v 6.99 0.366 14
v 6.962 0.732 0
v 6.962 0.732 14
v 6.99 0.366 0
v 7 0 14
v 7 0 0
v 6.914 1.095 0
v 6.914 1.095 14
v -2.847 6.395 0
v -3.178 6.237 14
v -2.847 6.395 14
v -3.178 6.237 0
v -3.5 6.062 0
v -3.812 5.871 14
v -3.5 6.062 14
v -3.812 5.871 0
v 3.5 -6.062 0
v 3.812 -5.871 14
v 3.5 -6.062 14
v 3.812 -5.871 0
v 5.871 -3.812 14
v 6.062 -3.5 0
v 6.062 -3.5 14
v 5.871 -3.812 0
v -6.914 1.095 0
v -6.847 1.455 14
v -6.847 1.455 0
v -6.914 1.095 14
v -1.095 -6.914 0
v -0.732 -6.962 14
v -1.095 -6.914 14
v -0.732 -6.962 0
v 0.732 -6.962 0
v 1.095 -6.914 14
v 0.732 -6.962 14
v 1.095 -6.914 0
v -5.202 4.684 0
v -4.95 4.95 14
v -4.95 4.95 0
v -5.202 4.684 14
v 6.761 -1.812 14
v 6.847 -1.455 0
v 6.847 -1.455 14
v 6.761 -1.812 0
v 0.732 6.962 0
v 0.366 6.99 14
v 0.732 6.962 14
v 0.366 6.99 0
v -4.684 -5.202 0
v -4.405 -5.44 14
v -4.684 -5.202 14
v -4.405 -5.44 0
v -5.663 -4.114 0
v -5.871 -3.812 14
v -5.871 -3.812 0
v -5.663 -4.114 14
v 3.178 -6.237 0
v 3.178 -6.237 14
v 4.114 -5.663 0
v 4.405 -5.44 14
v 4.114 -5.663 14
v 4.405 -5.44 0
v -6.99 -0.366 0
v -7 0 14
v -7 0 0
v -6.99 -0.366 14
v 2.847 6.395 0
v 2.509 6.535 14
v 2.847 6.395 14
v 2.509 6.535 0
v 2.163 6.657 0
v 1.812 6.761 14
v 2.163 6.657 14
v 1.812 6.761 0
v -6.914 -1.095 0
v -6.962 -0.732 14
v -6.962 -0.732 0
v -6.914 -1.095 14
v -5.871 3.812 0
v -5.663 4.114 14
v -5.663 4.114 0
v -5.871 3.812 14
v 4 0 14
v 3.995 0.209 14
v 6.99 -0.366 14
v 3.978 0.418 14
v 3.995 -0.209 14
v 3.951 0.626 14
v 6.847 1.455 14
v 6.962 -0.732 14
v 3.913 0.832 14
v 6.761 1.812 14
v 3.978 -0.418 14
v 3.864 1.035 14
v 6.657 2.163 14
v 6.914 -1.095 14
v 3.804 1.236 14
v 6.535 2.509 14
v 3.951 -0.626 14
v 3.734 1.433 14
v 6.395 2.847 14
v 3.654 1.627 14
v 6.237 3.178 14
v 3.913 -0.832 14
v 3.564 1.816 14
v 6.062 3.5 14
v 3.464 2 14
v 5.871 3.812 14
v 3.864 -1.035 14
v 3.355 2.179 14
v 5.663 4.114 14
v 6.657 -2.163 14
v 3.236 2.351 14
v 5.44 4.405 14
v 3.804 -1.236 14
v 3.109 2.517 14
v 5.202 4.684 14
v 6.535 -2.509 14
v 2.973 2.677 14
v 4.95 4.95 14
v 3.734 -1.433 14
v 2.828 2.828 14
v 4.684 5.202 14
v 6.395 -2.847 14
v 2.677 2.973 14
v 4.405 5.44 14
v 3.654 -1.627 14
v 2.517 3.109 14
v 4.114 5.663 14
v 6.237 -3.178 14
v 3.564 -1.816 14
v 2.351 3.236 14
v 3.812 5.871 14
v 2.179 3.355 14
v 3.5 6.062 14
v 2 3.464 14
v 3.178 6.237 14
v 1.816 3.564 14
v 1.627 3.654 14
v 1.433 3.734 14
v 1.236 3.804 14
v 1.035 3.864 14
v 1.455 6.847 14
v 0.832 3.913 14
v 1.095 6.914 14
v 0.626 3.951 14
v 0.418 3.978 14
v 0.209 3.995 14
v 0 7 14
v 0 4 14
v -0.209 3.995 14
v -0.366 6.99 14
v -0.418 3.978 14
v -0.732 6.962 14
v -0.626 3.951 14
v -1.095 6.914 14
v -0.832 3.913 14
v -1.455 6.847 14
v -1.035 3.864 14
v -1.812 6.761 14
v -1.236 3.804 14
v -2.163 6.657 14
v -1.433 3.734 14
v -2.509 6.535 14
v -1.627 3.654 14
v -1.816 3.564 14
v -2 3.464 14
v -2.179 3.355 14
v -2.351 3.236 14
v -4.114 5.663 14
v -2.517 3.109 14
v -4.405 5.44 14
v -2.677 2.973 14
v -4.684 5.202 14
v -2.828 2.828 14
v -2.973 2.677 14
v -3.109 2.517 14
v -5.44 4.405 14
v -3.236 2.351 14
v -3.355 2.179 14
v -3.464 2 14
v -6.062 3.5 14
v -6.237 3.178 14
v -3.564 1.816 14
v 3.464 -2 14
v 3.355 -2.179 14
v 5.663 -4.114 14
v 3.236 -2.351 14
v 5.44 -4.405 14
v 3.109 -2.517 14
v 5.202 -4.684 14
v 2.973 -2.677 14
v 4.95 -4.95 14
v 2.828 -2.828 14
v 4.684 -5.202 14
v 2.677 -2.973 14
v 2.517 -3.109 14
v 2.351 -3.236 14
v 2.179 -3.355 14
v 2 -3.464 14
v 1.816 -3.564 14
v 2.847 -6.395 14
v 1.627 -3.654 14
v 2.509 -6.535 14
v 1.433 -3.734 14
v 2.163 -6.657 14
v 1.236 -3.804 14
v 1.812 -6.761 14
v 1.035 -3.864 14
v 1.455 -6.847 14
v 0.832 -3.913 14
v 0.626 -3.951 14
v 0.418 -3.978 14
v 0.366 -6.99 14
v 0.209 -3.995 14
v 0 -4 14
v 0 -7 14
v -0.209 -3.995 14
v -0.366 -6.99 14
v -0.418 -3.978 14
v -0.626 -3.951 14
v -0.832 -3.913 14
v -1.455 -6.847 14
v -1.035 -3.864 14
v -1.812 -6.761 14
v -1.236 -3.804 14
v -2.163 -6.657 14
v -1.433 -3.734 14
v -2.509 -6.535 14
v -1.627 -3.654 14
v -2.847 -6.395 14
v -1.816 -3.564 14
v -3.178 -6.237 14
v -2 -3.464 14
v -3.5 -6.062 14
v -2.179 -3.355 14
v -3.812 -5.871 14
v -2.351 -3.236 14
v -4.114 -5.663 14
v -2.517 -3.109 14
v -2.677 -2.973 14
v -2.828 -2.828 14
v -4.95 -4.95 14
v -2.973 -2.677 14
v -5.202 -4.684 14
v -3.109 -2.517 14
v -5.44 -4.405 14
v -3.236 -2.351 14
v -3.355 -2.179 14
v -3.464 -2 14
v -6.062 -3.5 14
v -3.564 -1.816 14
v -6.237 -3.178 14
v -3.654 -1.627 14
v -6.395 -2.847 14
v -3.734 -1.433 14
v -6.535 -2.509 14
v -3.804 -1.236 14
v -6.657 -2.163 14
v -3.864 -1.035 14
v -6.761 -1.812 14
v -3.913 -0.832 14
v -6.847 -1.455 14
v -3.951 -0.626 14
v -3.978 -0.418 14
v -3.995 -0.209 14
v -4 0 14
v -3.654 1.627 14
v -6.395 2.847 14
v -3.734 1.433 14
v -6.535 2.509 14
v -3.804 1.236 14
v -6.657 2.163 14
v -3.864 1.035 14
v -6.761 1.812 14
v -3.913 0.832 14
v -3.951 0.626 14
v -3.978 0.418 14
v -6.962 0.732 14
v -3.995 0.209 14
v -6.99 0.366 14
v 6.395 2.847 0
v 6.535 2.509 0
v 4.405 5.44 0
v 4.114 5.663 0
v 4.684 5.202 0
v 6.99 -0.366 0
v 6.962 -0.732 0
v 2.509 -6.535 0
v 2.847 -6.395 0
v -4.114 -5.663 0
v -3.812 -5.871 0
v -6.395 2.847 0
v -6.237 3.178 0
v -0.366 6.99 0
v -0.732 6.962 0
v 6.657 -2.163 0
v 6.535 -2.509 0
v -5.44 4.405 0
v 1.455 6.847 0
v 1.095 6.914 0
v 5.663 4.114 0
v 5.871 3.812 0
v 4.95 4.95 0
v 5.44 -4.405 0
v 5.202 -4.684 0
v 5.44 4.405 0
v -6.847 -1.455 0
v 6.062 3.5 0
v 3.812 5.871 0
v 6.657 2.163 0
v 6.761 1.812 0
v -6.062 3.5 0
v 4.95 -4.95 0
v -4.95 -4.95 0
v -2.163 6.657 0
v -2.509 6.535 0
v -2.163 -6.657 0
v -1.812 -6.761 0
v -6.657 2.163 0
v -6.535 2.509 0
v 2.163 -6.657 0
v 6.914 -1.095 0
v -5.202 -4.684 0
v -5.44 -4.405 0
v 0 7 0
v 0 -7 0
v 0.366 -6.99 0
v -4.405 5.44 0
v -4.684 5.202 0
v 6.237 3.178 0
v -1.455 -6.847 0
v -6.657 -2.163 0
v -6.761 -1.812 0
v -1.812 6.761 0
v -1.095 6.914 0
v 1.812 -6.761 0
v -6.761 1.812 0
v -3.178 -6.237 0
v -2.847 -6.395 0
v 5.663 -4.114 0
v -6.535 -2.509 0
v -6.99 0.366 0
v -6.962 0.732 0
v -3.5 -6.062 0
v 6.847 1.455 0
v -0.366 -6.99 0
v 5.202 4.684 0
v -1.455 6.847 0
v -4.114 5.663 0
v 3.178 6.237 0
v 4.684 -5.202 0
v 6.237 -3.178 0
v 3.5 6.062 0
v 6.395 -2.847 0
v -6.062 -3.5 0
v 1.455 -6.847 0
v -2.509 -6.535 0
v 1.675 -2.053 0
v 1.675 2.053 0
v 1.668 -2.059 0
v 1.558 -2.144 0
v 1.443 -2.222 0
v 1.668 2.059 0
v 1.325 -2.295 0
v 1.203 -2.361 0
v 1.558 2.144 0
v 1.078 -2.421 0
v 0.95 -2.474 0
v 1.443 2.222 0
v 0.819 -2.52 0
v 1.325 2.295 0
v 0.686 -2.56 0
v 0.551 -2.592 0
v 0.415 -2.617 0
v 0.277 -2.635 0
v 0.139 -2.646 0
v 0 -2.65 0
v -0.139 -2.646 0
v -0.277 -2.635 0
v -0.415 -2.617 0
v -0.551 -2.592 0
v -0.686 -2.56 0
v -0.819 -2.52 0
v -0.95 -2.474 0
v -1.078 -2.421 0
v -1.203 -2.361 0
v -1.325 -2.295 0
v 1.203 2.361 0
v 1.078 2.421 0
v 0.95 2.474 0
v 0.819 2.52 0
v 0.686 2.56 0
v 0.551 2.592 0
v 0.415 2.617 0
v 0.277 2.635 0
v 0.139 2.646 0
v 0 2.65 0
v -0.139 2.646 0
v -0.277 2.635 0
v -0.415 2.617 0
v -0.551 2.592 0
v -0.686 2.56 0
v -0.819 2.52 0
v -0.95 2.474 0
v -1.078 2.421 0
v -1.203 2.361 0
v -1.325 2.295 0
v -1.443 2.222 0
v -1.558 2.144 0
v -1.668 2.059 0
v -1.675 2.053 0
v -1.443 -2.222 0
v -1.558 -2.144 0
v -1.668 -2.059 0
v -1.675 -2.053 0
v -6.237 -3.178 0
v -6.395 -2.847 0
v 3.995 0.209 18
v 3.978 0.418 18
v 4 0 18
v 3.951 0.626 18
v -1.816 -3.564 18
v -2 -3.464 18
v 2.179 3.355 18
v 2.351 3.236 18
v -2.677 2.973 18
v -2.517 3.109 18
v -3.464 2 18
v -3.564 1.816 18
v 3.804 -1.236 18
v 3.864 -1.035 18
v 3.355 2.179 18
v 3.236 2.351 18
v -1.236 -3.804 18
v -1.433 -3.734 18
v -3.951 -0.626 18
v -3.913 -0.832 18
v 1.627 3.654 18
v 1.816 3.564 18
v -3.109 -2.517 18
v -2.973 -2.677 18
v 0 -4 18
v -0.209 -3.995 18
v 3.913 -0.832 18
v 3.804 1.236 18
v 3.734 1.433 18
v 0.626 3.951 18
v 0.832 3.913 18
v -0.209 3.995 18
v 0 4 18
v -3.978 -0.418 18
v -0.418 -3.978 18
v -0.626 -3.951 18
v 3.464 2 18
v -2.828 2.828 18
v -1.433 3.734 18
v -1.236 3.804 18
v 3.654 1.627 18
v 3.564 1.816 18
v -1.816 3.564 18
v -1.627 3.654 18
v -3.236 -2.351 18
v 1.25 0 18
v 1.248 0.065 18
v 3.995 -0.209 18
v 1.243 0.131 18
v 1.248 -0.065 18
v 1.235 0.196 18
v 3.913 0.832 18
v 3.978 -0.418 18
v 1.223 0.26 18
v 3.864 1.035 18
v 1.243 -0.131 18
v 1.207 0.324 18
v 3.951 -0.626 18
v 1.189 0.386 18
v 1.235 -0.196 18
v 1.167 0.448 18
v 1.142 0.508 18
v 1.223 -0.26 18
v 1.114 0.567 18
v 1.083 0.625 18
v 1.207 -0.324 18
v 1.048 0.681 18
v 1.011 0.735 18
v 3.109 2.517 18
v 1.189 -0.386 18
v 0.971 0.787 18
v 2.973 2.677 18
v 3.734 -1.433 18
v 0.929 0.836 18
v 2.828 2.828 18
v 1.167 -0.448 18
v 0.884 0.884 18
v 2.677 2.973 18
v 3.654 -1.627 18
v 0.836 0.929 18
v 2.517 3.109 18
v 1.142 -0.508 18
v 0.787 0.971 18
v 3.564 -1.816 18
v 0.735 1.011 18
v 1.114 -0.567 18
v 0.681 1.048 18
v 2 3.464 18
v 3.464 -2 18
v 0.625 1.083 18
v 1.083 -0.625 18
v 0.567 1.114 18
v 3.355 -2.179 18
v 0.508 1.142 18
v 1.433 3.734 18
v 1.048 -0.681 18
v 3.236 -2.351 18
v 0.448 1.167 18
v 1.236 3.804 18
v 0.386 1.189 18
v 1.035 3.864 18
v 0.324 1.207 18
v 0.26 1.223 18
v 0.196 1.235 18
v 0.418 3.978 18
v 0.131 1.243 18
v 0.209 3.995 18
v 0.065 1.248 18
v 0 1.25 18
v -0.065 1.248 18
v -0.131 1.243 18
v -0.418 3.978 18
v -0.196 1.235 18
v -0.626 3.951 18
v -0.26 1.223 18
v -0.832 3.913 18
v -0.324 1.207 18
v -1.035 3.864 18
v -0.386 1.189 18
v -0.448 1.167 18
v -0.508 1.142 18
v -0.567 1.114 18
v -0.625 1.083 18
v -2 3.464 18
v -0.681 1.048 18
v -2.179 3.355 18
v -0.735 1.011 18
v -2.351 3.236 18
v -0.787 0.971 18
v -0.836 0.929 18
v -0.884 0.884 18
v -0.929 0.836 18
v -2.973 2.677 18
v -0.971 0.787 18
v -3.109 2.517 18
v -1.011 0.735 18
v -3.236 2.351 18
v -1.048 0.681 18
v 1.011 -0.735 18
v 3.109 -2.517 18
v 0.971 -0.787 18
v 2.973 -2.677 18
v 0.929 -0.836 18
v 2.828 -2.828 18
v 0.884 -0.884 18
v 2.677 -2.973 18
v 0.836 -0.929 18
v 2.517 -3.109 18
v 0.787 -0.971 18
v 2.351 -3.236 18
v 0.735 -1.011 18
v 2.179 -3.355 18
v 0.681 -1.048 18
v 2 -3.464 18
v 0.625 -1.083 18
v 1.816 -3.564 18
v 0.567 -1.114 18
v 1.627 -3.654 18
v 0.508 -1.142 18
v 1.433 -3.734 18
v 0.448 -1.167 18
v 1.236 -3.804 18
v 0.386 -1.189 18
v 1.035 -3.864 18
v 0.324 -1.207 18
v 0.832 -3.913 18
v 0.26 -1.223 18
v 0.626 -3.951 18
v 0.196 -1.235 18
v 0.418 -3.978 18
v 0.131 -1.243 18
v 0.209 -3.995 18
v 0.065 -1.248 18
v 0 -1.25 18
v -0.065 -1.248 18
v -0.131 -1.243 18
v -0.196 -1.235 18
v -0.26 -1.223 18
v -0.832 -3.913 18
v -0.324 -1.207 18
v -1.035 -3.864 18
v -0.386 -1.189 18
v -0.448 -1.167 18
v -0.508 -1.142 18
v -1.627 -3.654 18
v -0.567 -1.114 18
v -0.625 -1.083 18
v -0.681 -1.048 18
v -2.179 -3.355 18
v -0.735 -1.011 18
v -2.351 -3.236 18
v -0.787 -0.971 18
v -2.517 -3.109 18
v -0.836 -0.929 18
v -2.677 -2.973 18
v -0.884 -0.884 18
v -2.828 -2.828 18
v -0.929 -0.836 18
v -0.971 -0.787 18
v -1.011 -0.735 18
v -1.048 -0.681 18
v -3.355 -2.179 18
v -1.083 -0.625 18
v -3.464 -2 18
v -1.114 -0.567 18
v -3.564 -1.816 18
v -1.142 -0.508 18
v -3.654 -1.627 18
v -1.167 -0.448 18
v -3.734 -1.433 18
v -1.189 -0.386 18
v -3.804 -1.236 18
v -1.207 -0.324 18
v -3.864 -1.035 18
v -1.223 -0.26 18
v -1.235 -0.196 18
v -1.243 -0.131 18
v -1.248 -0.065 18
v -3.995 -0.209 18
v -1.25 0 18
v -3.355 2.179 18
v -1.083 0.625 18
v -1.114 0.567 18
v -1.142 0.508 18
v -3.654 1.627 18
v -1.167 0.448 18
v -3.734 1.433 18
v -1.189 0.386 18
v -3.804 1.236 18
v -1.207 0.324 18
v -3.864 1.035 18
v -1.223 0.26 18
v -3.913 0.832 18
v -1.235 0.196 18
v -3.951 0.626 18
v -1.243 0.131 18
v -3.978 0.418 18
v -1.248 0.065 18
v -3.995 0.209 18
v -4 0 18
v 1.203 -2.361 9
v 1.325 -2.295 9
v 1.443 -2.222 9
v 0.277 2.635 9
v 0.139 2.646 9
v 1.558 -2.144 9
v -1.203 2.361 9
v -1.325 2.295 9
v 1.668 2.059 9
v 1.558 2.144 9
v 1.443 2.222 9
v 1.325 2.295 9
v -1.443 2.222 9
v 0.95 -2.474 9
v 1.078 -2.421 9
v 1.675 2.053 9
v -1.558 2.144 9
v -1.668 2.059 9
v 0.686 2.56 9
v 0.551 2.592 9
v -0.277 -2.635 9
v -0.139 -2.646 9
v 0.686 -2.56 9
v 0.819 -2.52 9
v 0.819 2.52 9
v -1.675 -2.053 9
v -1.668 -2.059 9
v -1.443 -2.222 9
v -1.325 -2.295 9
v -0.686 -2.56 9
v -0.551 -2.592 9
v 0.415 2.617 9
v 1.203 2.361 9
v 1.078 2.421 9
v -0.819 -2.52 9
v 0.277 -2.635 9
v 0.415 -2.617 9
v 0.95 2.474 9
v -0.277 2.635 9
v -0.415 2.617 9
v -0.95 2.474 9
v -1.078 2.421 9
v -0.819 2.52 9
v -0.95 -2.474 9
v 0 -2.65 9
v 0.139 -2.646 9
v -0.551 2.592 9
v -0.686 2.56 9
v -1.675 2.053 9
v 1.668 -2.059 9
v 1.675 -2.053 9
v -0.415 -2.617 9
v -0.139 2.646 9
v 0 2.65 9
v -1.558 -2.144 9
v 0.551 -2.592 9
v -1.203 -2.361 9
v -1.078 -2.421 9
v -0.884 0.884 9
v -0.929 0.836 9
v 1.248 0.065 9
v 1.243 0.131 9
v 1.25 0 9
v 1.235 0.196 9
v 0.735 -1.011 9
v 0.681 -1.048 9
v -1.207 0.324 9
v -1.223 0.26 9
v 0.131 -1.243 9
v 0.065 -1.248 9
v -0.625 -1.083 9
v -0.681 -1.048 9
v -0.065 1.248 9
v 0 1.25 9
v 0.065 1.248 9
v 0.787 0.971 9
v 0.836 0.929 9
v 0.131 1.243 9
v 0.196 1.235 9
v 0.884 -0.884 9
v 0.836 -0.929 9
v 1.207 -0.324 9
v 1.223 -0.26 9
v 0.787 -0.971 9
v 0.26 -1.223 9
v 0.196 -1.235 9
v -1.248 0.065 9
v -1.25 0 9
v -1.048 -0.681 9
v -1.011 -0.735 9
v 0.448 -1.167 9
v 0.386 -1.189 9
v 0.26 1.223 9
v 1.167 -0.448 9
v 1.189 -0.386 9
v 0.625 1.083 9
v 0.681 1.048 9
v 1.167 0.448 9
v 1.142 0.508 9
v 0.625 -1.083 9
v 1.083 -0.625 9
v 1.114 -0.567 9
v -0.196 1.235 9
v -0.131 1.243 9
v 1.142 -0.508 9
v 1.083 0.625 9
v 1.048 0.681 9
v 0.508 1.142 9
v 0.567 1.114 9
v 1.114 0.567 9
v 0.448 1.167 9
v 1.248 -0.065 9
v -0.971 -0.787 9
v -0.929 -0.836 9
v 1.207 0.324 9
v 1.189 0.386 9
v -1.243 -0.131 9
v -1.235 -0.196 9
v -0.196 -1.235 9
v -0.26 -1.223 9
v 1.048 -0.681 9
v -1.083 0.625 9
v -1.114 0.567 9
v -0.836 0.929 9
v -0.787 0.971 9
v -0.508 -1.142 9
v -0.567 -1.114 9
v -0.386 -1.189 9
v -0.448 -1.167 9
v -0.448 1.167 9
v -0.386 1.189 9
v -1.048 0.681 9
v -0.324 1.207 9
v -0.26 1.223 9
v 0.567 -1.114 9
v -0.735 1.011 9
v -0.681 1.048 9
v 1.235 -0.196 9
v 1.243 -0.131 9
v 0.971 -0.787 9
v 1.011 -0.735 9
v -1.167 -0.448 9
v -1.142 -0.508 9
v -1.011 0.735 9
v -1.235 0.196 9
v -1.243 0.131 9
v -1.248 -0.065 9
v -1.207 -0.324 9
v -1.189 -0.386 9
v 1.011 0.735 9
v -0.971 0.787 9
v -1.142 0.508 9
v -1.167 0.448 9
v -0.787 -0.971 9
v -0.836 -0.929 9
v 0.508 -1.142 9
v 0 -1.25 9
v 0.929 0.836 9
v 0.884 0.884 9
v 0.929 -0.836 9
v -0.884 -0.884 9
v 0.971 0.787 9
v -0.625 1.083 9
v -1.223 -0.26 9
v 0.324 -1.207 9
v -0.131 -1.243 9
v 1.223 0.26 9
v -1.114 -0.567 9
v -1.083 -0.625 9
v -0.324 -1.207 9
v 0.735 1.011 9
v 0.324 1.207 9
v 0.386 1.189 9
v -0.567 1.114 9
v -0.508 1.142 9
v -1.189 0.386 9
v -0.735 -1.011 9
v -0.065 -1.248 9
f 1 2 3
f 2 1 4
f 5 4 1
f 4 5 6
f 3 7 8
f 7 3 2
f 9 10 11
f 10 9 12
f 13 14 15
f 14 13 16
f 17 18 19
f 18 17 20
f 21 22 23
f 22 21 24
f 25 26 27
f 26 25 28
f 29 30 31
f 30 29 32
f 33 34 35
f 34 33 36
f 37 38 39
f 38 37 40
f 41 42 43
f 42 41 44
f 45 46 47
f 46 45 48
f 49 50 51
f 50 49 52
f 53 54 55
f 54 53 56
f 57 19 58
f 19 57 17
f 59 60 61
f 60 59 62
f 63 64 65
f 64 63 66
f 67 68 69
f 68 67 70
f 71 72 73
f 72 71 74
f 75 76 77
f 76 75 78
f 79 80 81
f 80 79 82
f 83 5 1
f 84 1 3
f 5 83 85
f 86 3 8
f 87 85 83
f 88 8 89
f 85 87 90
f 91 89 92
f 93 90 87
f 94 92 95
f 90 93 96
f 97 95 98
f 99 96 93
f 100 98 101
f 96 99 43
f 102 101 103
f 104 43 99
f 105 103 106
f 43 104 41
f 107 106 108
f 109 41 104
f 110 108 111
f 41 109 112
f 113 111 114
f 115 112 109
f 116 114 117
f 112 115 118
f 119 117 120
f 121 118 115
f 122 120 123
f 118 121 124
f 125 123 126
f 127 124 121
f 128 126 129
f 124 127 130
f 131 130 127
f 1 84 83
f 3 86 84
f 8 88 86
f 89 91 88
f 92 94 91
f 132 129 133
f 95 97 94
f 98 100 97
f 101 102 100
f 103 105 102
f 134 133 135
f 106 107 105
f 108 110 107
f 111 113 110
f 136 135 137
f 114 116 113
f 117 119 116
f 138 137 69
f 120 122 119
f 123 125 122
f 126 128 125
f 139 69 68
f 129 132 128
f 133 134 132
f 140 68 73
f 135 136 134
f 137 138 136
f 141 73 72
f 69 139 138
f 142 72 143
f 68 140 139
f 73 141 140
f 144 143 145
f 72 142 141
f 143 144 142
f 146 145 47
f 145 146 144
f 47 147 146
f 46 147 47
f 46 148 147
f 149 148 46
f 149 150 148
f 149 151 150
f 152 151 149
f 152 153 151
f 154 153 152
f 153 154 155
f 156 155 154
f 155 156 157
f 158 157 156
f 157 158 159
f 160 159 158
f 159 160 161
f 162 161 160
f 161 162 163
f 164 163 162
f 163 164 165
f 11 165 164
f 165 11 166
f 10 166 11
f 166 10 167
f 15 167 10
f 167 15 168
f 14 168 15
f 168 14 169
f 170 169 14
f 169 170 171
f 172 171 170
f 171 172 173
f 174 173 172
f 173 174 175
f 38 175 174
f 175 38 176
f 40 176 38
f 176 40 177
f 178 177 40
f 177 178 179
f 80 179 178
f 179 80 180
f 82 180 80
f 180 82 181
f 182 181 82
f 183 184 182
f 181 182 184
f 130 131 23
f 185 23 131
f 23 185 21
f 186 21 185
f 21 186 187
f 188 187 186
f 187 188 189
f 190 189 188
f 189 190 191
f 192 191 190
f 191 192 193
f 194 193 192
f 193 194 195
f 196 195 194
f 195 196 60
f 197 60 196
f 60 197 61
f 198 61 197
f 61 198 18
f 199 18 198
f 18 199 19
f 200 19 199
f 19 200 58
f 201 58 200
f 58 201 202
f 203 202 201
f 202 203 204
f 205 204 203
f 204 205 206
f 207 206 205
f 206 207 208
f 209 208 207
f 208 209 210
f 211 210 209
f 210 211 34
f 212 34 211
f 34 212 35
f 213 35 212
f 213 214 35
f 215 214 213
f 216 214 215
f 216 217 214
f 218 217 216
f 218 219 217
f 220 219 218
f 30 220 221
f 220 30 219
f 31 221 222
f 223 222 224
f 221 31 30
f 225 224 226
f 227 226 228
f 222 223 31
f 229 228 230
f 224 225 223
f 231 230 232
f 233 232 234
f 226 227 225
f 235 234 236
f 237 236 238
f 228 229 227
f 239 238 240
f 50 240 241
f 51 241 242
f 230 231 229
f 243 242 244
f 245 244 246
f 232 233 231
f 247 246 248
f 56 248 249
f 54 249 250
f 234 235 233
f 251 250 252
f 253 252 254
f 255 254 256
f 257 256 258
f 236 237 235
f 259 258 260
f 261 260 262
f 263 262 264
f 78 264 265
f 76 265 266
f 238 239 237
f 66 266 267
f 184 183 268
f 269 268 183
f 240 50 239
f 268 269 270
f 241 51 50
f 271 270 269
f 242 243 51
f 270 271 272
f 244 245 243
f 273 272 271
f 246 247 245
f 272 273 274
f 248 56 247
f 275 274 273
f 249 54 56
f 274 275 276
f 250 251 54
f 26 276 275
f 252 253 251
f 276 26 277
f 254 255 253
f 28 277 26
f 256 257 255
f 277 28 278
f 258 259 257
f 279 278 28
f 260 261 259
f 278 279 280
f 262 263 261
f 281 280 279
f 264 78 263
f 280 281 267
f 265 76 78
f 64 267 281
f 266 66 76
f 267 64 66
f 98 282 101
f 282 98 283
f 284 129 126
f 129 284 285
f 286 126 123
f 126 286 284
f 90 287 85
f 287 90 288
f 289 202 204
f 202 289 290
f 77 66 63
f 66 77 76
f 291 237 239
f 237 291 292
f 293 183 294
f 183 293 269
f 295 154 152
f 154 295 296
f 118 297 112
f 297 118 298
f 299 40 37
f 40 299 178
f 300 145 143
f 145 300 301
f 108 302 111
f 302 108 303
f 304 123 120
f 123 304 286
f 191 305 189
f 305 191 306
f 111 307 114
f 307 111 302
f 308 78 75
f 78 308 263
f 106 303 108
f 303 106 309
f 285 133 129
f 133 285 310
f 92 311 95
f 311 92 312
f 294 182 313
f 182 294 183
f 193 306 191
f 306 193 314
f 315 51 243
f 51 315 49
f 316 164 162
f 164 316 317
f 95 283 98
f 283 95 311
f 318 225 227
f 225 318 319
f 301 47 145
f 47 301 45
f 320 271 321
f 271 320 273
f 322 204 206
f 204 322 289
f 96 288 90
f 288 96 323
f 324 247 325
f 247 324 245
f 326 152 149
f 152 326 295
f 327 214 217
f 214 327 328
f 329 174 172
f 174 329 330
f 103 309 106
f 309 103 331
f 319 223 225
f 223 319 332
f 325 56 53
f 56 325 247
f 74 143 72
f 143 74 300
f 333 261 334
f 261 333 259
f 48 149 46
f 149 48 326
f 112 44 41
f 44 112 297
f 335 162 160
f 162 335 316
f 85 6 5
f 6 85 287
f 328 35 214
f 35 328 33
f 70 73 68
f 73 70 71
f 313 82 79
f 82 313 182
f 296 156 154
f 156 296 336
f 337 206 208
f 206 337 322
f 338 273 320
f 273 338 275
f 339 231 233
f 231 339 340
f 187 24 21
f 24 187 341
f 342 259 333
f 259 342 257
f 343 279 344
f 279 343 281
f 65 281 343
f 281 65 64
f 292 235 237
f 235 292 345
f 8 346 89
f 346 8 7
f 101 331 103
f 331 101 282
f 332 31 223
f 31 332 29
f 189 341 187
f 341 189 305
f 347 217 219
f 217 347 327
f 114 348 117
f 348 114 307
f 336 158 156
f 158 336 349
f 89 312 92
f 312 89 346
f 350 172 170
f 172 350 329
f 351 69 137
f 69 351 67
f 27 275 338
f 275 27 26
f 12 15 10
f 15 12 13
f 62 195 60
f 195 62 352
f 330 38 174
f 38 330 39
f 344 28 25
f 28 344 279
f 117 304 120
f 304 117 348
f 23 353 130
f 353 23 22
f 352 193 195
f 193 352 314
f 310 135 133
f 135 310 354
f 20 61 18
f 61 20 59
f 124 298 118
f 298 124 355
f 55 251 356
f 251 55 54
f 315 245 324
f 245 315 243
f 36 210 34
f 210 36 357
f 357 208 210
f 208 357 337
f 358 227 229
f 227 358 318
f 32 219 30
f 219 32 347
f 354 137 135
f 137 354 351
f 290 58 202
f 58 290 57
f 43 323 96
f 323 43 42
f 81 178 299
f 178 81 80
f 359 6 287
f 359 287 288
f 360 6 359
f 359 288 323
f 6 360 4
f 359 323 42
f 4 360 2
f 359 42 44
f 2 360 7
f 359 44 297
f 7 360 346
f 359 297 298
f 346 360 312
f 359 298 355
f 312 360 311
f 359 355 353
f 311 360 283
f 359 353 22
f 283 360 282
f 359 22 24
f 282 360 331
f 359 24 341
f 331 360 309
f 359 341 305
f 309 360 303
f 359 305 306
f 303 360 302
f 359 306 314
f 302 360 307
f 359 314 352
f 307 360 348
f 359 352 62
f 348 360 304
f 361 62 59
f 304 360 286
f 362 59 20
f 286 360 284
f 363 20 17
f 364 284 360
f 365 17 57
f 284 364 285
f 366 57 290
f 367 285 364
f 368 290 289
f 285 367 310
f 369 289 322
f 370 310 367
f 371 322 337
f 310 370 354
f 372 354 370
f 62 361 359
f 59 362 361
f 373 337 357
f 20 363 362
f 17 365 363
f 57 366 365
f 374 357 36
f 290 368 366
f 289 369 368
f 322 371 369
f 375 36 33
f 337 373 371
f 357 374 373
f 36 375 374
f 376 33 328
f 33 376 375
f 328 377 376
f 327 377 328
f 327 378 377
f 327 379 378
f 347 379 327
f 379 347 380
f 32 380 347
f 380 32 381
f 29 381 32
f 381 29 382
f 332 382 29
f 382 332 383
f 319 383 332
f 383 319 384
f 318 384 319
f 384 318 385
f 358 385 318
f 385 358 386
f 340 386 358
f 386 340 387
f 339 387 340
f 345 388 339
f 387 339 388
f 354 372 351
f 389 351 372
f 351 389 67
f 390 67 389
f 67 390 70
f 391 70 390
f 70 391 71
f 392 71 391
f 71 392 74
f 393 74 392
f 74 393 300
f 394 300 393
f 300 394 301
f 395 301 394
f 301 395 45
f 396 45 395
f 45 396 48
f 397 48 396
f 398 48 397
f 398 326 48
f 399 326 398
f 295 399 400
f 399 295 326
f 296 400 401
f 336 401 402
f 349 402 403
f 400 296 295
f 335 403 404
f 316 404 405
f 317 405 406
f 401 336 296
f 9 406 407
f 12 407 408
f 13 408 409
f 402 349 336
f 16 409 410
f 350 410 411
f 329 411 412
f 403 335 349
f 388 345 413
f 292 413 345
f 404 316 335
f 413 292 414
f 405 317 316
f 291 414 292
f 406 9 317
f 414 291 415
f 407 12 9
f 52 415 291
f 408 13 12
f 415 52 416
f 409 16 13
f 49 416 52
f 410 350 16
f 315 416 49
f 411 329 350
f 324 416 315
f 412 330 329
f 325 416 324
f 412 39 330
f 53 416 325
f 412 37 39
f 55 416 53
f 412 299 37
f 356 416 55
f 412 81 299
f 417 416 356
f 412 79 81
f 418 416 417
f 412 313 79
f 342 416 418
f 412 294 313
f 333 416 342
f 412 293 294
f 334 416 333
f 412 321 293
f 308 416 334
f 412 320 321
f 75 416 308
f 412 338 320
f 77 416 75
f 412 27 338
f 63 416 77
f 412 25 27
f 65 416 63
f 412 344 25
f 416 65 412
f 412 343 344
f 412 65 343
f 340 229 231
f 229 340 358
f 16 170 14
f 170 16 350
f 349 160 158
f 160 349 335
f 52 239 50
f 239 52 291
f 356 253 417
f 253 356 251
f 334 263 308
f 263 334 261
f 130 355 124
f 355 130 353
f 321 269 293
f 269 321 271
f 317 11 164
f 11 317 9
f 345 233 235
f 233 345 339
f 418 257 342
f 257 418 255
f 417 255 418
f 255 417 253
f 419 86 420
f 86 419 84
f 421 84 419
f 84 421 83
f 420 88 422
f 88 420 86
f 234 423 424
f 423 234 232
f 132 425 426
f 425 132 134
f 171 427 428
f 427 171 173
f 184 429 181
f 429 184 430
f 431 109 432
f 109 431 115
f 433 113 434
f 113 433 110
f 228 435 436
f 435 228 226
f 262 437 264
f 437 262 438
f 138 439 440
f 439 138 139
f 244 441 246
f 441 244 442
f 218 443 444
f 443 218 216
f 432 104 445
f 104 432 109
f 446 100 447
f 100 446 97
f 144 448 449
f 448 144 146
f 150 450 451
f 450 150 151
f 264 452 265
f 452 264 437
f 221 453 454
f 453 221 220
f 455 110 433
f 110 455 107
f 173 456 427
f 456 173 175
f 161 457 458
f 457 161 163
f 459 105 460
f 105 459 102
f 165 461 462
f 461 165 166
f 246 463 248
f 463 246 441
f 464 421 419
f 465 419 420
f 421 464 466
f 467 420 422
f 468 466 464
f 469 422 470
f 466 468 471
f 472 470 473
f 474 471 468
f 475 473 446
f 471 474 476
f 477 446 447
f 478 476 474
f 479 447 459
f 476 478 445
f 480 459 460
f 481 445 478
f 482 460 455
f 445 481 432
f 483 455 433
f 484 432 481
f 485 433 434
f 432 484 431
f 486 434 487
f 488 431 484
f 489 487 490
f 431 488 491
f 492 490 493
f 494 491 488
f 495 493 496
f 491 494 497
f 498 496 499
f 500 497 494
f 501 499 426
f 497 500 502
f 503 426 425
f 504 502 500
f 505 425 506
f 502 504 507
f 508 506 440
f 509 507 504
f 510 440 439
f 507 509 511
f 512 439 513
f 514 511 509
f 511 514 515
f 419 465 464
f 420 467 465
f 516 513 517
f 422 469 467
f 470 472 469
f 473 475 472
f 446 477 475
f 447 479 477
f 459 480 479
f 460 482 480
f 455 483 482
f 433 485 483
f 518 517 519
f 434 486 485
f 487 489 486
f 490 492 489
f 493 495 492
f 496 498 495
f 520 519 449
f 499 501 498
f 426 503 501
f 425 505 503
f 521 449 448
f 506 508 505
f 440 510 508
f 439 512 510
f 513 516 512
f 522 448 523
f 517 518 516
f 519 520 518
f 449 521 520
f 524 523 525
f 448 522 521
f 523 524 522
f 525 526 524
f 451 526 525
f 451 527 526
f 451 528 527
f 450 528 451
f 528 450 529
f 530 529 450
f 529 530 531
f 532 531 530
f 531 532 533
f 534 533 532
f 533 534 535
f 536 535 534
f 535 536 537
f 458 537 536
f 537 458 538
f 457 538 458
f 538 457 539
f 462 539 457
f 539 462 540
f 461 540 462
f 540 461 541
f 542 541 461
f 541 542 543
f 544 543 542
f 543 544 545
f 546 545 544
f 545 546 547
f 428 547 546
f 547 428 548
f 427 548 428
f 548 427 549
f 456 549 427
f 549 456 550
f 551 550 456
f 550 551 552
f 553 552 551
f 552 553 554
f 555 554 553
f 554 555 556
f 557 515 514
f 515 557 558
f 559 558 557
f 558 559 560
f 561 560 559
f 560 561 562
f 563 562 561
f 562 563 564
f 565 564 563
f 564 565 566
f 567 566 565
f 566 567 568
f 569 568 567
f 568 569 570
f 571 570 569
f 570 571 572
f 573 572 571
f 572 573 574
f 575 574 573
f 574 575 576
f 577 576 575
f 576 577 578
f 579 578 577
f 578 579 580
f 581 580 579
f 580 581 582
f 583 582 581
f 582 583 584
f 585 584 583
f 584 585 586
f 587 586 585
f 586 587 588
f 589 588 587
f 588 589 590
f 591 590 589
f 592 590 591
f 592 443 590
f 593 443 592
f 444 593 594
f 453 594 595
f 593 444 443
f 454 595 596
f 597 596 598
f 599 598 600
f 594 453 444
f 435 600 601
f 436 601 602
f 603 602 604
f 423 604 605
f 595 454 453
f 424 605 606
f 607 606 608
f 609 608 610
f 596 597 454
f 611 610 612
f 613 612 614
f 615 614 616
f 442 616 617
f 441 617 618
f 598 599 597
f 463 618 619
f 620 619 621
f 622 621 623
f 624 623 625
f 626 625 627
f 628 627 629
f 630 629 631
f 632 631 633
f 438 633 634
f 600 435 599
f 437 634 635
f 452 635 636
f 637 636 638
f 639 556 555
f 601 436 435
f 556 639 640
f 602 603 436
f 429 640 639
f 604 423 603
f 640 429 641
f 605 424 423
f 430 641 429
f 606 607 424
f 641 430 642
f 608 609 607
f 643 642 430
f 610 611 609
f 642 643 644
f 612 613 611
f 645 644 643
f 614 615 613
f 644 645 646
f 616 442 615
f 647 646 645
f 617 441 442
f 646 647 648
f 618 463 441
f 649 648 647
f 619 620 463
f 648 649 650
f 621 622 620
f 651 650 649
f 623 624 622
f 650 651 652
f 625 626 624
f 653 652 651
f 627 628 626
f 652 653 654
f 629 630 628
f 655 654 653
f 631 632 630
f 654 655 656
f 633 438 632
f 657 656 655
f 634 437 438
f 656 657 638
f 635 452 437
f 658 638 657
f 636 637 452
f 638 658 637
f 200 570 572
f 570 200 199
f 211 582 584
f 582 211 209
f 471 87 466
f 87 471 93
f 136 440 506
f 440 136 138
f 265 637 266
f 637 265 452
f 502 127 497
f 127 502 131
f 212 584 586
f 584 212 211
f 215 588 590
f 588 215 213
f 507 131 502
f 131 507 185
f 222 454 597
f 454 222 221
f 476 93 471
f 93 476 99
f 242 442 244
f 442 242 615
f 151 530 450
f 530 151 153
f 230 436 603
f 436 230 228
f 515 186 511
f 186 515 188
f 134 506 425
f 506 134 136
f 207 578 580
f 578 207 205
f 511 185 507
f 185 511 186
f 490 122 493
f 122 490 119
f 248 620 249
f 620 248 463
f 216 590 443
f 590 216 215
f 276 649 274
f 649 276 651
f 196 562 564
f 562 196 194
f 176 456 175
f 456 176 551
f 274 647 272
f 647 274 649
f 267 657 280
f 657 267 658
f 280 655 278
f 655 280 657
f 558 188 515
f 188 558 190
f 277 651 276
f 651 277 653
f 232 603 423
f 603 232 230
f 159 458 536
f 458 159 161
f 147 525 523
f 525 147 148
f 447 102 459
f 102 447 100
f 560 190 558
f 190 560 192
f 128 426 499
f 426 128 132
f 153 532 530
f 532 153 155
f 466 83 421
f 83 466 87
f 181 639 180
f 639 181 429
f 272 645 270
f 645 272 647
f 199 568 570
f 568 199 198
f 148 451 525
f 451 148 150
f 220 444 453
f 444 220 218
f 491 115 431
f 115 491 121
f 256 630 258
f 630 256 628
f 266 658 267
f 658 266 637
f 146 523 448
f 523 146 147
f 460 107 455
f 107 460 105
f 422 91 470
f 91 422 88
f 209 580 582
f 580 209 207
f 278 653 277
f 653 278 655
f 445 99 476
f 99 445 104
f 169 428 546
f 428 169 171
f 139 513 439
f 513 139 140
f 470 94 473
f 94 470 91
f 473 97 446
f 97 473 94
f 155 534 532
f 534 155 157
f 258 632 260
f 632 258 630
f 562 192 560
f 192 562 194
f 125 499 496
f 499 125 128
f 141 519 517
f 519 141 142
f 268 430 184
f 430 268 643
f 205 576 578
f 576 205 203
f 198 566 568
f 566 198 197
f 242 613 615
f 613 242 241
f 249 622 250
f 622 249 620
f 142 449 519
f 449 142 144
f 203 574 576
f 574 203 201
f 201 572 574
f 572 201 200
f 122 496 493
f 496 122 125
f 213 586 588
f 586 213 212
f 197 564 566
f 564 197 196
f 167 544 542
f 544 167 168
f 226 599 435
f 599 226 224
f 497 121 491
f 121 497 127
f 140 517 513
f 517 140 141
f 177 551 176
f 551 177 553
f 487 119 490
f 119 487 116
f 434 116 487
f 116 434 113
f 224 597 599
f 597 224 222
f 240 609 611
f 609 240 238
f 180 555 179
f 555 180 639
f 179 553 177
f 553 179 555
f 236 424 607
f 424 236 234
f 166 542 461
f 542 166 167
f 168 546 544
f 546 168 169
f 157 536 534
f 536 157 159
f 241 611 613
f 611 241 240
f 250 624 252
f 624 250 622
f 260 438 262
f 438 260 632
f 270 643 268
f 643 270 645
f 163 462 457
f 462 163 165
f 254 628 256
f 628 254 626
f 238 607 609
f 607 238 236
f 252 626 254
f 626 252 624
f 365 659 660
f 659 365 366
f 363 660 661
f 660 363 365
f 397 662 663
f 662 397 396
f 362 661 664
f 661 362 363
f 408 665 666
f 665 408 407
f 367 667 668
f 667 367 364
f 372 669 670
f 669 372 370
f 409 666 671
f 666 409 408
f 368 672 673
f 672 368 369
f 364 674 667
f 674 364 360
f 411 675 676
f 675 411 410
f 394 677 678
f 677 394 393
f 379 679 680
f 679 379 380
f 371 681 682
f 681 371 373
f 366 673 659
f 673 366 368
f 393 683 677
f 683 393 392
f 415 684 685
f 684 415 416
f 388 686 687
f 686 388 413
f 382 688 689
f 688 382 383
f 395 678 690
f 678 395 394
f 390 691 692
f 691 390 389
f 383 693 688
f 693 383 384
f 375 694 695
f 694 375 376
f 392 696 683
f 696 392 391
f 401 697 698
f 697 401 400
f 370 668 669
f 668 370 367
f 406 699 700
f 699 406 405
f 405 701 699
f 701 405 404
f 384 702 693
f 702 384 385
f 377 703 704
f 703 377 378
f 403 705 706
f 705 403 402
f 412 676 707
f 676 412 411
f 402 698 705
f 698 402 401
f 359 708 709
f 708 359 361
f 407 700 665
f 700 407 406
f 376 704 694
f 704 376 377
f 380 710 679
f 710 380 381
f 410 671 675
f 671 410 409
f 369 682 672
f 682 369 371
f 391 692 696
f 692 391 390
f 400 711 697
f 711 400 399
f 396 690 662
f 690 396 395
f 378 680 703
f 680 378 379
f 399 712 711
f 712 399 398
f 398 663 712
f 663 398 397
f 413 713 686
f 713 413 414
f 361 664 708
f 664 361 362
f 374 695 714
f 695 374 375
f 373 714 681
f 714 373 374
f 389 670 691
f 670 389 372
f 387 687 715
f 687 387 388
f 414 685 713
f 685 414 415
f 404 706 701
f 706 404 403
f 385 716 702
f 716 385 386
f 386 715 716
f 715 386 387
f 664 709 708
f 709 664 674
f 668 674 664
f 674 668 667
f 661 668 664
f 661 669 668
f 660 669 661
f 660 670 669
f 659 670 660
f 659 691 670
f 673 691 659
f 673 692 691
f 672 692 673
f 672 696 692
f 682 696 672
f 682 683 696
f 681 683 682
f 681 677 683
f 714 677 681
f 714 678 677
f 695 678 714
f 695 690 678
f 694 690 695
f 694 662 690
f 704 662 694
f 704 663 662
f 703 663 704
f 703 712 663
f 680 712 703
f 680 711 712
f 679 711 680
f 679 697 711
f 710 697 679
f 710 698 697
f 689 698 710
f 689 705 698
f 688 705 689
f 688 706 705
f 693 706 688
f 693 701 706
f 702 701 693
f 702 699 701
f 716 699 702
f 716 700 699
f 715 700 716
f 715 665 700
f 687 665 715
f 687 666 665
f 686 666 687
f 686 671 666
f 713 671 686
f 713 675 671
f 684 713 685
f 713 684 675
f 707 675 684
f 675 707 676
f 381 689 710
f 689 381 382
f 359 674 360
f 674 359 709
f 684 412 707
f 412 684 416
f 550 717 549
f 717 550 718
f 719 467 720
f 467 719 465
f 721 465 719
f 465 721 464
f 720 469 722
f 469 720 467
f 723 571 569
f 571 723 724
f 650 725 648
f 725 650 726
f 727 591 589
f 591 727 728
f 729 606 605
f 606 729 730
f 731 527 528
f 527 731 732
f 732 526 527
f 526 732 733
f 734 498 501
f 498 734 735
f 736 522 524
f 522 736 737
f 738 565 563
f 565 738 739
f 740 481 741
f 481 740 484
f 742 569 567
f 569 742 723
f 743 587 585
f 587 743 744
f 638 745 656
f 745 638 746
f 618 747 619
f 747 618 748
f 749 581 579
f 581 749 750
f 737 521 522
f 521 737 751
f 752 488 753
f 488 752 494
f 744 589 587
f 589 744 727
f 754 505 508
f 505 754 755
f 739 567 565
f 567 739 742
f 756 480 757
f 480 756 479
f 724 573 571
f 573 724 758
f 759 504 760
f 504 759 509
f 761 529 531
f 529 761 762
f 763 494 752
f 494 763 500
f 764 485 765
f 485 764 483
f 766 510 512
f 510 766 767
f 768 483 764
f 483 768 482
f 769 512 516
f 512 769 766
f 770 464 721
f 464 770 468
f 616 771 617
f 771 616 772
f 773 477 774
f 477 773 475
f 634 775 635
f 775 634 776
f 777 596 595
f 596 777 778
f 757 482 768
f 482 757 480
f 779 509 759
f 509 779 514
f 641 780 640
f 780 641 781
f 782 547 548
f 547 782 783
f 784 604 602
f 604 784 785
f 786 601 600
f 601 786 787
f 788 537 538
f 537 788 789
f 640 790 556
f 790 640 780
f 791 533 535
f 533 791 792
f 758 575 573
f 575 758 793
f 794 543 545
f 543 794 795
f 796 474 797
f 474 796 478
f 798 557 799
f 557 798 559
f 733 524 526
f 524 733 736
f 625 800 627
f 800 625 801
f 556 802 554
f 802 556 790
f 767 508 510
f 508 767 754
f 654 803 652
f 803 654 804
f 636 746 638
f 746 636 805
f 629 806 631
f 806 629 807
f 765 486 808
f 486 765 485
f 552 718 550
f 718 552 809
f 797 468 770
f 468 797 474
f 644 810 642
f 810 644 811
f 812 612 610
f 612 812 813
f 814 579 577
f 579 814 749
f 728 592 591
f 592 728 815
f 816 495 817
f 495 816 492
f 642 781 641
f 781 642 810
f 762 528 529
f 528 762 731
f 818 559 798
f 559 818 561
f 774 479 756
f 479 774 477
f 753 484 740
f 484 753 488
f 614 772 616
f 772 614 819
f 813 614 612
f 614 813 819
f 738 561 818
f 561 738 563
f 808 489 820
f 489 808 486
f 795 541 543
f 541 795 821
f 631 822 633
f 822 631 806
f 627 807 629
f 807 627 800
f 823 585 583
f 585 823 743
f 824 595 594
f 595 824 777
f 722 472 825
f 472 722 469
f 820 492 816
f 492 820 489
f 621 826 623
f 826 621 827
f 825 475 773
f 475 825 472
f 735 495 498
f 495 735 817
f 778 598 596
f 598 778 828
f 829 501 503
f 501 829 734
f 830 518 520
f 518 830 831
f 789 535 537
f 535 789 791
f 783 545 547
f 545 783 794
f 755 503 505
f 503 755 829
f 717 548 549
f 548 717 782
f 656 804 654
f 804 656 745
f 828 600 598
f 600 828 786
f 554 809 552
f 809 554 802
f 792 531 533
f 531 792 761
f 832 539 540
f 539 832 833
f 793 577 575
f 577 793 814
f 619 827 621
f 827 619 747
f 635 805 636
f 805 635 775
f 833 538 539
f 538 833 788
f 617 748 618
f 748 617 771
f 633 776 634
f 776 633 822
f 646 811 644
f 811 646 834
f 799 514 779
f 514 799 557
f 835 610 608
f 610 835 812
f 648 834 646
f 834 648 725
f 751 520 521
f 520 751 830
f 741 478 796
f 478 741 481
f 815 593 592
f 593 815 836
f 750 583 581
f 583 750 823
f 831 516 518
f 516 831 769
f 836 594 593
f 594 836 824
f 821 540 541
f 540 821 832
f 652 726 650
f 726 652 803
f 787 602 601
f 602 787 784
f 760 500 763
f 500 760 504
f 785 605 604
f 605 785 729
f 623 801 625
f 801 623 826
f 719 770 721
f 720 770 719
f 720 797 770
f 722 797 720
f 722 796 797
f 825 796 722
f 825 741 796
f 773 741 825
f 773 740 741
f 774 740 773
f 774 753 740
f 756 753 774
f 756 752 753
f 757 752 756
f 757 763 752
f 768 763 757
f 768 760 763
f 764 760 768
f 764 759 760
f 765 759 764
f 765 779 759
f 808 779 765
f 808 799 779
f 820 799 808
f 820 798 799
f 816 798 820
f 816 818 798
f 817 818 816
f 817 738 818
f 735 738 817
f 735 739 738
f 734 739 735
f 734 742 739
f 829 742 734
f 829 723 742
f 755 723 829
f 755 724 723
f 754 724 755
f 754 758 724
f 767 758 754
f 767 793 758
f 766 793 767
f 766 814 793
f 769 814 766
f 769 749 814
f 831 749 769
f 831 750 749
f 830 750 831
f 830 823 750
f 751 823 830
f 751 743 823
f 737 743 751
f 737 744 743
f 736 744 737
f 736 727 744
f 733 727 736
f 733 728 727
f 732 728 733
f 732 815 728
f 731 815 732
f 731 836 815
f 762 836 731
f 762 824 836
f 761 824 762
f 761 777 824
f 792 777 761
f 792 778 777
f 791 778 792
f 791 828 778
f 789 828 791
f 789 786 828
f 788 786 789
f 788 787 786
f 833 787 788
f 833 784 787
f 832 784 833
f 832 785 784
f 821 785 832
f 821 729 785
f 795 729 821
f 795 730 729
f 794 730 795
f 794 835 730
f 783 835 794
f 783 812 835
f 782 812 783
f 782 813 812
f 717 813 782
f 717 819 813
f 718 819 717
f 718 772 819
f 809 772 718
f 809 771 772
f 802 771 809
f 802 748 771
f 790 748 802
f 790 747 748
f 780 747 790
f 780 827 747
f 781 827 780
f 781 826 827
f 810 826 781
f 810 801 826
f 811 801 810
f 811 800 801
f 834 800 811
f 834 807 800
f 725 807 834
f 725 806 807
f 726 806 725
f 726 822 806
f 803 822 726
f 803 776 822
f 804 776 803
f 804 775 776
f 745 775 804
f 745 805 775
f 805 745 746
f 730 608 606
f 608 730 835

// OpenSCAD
// file: params.scad
// ─────────────────────────────────────────────────────────────────────────────
//  params.scad — shared dimensions for every printed part. Edit HERE, once.
//
//  Almost everything is driven off measured hardware. The two things you MUST
//  verify with calipers on your actual parts before printing the base/frame:
//    • panel_w / panel_h / panel_depth  (your 64×64 module's real size)
//    • the 28BYJ-48 mounting-tab hole spacing (usually 35 mm)
//  Defaults below are typical values for a P3 64×64 panel + a stock 28BYJ-48.
// ─────────────────────────────────────────────────────────────────────────────

// Global smoothness
$fn = 120;

// ── RGB matrix panel (P3 64×64) ──────────────────────────────────────────────
panel_px     = 64;
panel_pitch  = 3.0;                 // P3 = 3 mm pixel pitch
panel_w      = panel_px * panel_pitch;   // ≈ 192 mm (measure yours!)
panel_h      = panel_px * panel_pitch;   // ≈ 192 mm
panel_depth  = 14;                  // module thickness incl. LEDs (no connectors)
panel_border = 2;                   // dead PCB border around the lit area

// ── Acrylic diffuser ─────────────────────────────────────────────────────────
diffuser_thick = 2.0;               // frosted acrylic sheet thickness
diffuser_gap   = 3.0;               // air gap panel→acrylic (the "glow" distance)

// ── 28BYJ-48 stepper ─────────────────────────────────────────────────────────
motor_body_dia   = 28.5;            // round body
motor_tab_span   = 35.0;            // centre-to-centre of the two mounting holes
motor_tab_hole   = 4.2;            // M4 screw clearance (tabs are ~4.2 mm)
shaft_dia        = 5.0;             // output shaft
shaft_flat       = 3.0;             // across-flats of the D
shaft_len        = 9.0;             // usable shaft length
motor_shaft_offset = 8.0;           // shaft is offset this far from the body centre

// ── Coupler (motor shaft → record riser) ─────────────────────────────────────
coupler_dia      = 14;              // outer riser diameter
coupler_h        = 14;              // lifts the record above the deck
coupler_boss_dia = 8;               // top boss that plugs into the record
coupler_boss_h   = 4;

// ── Record ───────────────────────────────────────────────────────────────────
// Sized to nest INSIDE the 24-LED ring (~86 mm OD, ~68 mm inner hole) with a
// glowing halo gap all round.
record_dia    = 60;
record_thick  = 2.4;
label_dia     = 22;                 // printed-label recess
label_depth   = 0.6;
record_hole   = coupler_boss_dia + 0.3;  // press-fit onto the coupler boss

// ── WS2812B halo ring (24-LED, ~86 mm OD) ────────────────────────────────────
halo_ring_dia   = 74;               // LED-circle diameter of the 24-LED ring (measure yours!)
halo_channel_w  = 12;               // channel width — holds the ~9 mm-wide ring PCB
halo_channel_d  = 4;                // channel depth

// ── Turntable base / deck ────────────────────────────────────────────────────
// Deck must be wider than the panel (≈192 mm) so the frame slot fits and the
// whole thing doesn't tip. 210 gives a comfortable margin either side.
deck_w      = 210;                  // footprint width  (> panel_w for stability)
deck_d      = 150;                  // footprint depth
deck_top    = 3;                    // top plate thickness
wall_h      = 45;                   // internal height to hide SMPS + ESP32 + wiring
wall_t      = 2.4;                  // wall thickness
frame_slot_w = panel_w + 2*panel_border + 2;   // slot the matrix frame plugs into
frame_slot_t = 8;                   // slot depth (front-to-back) — matches frame tenon
// main file
// ─────────────────────────────────────────────────────────────────────────────
//  coupler.scad — motor-shaft → record riser.
//
//  Bottom: a D-shaped bore that grips the 28BYJ-48's flatted shaft (no slip).
//  Top:    a boss that press-fits the record's centre hole, lifting the record
//          clear of the deck so the motor hides underneath.
//  Print with the shaft opening on the bed (boss up) — no supports.
// ─────────────────────────────────────────────────────────────────────────────
include <params.scad>

// Negative shape matching a D-shaft: a cylinder with two opposite flats.
module d_bore(dia, flat, h) {
  intersection() {
    cylinder(d = dia, h = h);
    translate([0, 0, h/2]) cube([flat, dia + 2, h + 0.2], center = true);
  }
}

module coupler() {
  difference() {
    union() {
      cylinder(d = coupler_dia, h = coupler_h);                          // riser
      translate([0, 0, coupler_h])
        cylinder(d = coupler_boss_dia, h = coupler_boss_h);              // record boss
    }
    // grip the motor shaft (from the bottom)
    translate([0, 0, -0.1]) d_bore(shaft_dia + 0.3, shaft_flat + 0.35, shaft_len + 0.1);
    // small central relief up through the boss (ejector / glue escape)
    translate([0, 0, shaft_len]) cylinder(d = 2.5, h = coupler_h + coupler_boss_h);
  }
}

coupler();
